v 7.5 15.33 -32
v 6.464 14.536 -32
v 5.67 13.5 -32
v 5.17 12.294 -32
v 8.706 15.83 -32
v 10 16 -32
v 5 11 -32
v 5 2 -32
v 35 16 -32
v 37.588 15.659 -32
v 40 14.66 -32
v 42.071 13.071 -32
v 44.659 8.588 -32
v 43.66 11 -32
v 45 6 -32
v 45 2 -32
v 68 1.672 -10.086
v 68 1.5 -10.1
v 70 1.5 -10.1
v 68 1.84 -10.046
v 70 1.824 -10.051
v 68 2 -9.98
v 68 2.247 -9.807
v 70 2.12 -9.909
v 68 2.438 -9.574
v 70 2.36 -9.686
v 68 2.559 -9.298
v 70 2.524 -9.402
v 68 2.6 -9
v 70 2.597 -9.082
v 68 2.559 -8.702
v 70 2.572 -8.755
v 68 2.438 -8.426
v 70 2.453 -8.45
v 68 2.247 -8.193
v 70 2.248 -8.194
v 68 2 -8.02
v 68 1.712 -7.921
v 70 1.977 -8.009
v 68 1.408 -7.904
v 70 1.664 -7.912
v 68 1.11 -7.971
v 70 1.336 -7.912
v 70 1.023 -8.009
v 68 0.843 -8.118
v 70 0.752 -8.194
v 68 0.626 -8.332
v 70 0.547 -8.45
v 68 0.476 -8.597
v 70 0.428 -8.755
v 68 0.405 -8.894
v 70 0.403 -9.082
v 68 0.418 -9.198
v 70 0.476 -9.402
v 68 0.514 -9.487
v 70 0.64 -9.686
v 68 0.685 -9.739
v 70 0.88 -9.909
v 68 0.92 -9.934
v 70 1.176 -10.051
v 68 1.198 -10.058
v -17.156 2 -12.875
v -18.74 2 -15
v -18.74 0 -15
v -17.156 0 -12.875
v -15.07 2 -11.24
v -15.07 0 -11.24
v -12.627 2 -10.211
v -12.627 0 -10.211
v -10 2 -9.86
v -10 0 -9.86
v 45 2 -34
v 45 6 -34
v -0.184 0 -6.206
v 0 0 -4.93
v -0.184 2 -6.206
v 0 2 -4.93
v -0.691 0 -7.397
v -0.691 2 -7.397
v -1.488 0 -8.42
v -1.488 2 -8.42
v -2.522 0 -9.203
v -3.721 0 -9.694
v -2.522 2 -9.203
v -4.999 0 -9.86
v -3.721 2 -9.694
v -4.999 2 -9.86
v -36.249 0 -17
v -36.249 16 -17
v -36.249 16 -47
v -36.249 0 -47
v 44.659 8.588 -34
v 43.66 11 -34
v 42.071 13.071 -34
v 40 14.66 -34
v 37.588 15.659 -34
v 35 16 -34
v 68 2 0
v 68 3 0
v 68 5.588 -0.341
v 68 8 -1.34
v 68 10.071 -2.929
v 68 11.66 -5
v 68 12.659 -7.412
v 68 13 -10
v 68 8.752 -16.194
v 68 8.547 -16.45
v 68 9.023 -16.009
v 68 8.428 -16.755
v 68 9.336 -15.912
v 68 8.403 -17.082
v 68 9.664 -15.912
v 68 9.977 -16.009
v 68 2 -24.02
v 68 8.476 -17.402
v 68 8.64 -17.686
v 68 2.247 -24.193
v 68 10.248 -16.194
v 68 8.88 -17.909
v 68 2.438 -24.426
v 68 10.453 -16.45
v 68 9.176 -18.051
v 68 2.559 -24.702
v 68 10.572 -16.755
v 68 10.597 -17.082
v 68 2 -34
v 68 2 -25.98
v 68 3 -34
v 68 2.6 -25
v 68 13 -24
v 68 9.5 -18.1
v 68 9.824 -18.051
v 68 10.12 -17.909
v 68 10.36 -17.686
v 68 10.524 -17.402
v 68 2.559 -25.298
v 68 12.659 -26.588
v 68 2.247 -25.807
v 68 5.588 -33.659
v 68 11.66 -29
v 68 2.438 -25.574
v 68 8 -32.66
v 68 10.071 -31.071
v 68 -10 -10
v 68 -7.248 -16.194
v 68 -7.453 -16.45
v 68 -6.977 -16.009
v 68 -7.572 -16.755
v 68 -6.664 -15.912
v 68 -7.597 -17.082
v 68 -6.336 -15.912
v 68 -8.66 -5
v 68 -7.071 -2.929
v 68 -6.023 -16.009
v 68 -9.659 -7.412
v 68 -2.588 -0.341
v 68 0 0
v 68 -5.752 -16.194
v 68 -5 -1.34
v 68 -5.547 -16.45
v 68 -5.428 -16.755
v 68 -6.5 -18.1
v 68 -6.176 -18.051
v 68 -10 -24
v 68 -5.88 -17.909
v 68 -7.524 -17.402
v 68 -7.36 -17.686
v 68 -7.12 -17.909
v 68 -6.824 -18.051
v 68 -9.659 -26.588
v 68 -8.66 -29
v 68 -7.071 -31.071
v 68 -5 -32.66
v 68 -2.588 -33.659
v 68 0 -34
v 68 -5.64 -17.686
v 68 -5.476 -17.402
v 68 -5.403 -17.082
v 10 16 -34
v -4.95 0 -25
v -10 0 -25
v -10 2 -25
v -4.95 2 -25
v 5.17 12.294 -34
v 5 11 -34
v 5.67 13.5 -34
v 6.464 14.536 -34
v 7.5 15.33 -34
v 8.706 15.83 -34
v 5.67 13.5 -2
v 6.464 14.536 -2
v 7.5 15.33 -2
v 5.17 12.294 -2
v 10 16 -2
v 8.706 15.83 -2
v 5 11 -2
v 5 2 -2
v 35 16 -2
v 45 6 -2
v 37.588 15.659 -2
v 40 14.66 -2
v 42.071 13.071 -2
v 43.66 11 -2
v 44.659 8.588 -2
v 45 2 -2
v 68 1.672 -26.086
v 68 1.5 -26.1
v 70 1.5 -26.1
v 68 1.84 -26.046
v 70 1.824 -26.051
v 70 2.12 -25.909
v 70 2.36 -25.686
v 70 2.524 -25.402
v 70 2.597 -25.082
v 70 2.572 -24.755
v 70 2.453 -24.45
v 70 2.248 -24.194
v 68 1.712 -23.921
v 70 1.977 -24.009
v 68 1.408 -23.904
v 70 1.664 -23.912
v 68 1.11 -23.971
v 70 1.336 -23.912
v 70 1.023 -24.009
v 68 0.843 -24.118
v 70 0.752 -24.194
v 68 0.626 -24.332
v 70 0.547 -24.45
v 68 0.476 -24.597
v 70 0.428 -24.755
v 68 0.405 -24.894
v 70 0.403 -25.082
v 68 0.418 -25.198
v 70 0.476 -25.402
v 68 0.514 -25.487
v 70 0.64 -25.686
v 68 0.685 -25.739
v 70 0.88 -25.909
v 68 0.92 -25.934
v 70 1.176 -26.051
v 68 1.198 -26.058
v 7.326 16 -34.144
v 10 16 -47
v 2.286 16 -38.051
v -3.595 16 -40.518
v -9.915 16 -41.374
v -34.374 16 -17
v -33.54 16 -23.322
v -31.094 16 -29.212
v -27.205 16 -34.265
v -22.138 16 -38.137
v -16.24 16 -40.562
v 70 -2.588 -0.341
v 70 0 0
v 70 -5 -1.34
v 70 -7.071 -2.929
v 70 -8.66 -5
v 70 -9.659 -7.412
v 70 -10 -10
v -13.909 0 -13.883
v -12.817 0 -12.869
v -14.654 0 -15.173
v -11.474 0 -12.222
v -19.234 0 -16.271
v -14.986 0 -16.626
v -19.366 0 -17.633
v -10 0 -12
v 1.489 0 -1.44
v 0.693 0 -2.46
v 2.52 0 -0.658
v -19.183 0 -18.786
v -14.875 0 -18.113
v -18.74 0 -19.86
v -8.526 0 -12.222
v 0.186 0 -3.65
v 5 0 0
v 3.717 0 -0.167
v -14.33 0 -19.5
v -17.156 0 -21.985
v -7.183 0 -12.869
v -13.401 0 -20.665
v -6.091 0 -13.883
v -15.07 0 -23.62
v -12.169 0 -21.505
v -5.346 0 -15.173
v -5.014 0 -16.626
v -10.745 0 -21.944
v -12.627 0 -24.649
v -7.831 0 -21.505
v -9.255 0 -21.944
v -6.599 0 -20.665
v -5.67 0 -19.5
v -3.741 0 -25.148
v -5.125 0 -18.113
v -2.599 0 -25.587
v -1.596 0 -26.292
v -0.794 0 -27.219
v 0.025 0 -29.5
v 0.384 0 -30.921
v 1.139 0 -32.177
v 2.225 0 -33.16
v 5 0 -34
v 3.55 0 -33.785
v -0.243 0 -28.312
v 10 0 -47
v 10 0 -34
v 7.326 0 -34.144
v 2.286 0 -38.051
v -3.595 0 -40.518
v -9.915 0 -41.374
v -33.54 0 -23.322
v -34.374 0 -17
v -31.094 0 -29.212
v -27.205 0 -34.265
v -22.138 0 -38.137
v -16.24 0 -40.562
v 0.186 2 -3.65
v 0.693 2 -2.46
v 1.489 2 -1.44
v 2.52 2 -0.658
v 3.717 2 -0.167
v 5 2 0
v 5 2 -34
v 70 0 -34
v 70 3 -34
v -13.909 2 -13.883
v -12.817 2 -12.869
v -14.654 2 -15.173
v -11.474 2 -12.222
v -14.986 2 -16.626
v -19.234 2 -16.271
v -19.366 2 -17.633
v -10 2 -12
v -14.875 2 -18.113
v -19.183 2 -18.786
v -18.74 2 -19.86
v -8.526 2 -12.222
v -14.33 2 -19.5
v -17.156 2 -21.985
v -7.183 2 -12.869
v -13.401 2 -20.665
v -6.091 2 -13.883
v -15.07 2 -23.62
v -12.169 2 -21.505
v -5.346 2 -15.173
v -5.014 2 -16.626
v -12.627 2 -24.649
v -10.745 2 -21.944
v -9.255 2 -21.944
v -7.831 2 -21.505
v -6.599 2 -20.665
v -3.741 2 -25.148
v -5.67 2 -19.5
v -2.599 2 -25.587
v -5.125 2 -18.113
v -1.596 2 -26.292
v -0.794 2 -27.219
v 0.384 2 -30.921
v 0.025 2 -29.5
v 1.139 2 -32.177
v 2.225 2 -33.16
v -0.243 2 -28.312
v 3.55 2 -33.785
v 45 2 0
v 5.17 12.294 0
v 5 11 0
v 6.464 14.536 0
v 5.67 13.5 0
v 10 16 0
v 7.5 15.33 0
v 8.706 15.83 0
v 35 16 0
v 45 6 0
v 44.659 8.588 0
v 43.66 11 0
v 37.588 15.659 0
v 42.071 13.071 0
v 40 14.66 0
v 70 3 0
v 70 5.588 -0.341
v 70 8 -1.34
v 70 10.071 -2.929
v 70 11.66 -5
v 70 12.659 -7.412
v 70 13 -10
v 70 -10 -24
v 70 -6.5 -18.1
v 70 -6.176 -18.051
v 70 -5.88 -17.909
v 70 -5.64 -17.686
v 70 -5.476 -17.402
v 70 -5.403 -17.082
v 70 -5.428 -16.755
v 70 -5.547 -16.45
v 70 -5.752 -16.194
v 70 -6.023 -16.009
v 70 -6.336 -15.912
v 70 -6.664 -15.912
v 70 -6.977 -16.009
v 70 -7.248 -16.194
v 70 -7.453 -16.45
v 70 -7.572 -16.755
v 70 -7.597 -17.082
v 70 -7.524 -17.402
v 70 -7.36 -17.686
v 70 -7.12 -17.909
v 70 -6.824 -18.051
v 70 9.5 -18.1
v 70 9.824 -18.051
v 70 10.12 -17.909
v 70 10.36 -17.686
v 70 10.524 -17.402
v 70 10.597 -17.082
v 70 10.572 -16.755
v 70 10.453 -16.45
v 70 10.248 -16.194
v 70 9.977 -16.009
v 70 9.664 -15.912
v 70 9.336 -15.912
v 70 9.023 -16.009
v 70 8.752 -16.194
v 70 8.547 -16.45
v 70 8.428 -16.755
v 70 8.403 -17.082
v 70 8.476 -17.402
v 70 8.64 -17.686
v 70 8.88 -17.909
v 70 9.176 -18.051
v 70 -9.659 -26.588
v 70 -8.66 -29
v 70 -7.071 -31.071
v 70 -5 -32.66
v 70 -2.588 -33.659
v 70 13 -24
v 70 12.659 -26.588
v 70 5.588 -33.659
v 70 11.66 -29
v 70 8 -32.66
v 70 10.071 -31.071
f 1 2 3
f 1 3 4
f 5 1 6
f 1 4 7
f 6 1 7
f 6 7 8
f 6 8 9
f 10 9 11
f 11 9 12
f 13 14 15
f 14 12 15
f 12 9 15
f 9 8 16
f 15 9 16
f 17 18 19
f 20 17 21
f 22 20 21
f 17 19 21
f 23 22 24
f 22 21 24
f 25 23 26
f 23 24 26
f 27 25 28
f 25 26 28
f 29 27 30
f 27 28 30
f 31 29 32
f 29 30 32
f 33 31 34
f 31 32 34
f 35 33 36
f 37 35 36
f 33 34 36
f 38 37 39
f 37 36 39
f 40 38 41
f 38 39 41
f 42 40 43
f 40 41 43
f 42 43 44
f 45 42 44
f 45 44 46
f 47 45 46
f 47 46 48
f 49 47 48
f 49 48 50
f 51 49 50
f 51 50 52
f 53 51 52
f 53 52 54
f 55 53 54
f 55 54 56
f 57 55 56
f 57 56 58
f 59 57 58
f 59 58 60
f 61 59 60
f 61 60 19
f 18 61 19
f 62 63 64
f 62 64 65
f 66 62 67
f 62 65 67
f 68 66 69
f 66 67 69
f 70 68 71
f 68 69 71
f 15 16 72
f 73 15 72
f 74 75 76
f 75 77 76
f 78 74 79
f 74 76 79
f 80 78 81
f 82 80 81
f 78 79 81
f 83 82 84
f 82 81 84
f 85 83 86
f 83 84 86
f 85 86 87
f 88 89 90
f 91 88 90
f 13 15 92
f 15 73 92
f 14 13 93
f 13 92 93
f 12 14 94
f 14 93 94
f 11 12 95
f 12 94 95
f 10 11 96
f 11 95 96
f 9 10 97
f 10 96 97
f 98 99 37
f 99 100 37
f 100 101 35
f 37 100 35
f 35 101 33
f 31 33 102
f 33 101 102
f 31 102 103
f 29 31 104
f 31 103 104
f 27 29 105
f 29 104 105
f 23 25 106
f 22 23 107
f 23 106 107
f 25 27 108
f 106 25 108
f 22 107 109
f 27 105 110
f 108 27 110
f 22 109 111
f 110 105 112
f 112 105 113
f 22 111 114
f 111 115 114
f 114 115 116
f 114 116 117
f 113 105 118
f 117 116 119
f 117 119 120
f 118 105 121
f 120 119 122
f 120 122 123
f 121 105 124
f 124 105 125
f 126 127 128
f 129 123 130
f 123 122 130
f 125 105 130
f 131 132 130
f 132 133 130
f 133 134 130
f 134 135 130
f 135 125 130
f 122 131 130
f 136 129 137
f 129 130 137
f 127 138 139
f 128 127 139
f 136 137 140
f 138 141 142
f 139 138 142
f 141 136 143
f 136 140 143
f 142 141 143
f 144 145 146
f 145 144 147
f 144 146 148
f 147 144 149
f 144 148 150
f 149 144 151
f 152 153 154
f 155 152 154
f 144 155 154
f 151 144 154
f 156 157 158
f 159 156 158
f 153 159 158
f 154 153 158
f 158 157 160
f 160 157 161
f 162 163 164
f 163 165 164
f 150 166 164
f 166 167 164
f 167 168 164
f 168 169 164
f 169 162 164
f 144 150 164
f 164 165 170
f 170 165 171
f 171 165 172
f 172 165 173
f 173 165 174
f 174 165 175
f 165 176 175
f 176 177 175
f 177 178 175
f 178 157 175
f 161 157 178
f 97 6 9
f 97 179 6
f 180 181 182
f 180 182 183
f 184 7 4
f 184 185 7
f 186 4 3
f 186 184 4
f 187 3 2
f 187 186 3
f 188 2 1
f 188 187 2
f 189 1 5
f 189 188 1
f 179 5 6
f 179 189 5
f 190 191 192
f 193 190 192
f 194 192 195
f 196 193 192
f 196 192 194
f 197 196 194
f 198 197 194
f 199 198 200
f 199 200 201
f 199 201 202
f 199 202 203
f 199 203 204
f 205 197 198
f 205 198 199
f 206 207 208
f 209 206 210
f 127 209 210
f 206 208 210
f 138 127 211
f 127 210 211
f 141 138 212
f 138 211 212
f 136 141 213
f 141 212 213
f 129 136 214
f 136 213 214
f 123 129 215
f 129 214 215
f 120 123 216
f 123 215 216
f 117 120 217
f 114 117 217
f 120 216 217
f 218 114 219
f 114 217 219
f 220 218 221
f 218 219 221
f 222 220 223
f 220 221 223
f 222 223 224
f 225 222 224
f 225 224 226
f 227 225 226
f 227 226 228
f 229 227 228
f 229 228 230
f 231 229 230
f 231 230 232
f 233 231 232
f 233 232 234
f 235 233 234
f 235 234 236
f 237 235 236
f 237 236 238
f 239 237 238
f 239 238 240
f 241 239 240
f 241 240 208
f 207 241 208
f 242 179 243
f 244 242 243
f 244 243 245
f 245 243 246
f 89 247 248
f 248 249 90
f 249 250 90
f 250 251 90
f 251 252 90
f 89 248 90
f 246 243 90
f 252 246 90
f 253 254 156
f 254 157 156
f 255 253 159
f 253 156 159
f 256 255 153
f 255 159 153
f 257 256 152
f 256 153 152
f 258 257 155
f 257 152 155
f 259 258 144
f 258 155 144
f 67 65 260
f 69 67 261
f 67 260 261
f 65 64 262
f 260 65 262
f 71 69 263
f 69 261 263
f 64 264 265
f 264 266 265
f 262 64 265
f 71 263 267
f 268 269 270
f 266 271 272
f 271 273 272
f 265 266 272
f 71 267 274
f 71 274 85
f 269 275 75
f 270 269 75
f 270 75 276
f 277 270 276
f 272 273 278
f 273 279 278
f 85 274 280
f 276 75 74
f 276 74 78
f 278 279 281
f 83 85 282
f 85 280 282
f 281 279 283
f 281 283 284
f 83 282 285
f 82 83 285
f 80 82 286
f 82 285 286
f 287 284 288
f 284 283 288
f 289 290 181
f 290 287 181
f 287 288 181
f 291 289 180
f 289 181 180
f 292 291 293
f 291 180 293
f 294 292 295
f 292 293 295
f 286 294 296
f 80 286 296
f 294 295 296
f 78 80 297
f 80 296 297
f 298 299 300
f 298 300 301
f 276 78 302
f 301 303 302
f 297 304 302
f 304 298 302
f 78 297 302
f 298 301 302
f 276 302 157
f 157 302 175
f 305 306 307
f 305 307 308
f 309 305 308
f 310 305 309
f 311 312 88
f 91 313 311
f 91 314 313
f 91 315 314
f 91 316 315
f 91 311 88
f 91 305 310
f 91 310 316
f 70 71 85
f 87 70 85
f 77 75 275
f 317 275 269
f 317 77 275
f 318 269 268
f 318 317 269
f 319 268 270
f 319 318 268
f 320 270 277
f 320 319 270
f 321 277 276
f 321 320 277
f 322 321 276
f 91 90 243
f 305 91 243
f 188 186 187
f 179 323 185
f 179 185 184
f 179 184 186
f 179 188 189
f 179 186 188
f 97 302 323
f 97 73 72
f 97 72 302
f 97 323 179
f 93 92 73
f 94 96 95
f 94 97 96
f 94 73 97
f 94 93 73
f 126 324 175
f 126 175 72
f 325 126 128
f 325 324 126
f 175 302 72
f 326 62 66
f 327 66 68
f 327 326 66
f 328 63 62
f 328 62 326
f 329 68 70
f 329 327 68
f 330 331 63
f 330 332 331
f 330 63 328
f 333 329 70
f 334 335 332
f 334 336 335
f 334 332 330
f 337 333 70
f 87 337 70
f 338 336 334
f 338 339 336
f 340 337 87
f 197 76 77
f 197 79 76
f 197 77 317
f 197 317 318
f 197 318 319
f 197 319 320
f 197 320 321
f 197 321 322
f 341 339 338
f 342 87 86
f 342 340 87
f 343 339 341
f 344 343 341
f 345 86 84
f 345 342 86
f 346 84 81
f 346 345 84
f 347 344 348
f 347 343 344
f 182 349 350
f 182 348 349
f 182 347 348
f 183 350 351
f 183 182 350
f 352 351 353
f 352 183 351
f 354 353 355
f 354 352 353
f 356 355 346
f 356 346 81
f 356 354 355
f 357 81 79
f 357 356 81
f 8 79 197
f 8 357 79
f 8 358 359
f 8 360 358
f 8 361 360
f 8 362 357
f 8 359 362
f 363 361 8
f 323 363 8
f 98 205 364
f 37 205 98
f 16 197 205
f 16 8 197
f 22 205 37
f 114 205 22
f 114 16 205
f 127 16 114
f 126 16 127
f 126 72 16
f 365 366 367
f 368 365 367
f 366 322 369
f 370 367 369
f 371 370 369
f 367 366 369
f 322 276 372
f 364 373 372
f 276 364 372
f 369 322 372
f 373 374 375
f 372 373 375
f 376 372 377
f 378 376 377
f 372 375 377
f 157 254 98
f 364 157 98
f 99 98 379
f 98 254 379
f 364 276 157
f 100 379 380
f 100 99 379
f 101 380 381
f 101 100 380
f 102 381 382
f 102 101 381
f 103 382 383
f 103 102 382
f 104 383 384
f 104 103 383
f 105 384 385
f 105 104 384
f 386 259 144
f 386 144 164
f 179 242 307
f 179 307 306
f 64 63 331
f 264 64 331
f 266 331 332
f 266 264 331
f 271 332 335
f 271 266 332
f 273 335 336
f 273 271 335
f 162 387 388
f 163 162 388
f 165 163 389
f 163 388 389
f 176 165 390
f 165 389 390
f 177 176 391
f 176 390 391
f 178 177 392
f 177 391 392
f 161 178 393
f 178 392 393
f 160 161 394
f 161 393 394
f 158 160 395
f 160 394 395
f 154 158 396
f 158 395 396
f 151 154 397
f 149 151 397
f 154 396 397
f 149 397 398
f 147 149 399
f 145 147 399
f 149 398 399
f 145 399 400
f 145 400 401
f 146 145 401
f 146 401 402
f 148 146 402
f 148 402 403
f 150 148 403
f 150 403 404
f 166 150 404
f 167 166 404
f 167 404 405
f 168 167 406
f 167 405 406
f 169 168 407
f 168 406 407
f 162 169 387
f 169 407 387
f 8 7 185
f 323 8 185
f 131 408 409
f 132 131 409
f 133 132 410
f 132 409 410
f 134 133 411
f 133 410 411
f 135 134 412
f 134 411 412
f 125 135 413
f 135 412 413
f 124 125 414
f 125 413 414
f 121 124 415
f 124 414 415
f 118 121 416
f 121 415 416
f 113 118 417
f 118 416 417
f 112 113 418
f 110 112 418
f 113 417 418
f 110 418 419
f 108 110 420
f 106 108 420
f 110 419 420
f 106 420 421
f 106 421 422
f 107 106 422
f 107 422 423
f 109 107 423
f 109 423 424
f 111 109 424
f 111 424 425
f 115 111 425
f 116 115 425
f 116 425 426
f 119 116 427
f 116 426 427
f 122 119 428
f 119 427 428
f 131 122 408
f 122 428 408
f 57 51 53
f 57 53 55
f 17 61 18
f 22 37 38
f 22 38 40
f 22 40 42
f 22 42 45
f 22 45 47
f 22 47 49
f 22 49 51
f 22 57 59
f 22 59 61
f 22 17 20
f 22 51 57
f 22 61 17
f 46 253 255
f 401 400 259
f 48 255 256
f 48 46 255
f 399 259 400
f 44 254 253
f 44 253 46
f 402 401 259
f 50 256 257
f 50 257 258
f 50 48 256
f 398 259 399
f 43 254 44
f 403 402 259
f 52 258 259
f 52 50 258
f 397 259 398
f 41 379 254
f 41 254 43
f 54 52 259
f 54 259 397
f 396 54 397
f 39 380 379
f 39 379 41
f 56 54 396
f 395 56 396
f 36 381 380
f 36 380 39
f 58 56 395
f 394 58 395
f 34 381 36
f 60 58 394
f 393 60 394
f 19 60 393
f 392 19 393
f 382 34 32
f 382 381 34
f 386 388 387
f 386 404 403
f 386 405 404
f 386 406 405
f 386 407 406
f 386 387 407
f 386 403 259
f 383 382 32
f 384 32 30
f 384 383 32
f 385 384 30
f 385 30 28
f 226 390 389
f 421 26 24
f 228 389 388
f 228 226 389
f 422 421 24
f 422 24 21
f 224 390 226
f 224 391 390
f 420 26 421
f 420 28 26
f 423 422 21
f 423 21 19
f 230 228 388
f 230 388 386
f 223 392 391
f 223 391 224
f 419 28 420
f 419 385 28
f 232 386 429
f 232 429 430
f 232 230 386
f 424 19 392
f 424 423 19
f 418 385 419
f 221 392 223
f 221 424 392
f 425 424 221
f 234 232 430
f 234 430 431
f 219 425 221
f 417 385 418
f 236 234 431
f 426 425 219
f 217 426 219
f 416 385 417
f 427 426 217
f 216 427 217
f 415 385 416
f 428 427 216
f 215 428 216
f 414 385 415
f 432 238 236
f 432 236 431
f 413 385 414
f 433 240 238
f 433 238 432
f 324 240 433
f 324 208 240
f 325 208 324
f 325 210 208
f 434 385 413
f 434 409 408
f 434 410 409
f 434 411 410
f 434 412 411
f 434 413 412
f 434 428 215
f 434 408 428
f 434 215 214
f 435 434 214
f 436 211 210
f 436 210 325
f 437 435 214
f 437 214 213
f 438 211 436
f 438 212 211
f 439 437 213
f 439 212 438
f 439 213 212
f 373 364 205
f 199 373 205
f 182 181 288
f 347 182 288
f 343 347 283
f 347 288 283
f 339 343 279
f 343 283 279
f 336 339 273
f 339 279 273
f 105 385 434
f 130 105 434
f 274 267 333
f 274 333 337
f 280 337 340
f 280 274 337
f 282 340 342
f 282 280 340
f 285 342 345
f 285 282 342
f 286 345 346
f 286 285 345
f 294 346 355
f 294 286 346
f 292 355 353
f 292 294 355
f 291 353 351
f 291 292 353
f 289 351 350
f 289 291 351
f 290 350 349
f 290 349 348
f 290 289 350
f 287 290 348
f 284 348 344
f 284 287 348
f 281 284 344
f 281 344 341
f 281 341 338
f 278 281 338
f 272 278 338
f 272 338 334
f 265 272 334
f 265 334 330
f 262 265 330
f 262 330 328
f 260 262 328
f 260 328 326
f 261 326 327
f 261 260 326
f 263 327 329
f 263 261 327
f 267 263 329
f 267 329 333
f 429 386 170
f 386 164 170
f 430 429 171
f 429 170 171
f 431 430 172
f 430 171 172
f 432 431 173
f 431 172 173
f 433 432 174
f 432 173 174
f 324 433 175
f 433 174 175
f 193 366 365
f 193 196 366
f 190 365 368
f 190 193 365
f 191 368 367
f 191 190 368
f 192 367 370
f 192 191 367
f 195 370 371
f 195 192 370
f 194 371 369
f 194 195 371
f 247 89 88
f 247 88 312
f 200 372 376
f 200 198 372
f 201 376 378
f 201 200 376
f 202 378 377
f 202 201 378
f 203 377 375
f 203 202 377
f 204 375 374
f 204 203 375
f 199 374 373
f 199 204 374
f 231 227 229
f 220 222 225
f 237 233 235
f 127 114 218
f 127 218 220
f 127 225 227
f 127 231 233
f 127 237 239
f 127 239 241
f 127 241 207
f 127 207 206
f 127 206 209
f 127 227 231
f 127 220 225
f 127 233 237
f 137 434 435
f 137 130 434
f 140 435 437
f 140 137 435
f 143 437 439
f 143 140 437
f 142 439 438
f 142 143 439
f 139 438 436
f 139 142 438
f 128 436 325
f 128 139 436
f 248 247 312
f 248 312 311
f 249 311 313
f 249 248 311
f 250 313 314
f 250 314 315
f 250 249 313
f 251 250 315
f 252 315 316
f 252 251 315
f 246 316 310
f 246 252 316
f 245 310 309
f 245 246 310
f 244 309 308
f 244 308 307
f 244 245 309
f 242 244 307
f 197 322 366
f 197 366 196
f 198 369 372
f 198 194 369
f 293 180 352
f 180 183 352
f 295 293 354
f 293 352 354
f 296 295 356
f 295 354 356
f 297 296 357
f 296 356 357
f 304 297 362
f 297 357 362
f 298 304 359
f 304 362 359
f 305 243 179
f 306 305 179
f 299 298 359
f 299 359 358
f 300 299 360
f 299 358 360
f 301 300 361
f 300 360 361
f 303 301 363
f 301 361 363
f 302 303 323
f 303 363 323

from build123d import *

# Parameters (mm, degrees)
ESQUISSE1_W             = 70
ESQUISSE1_H             = 34
ESQUISSE1_W_2           = 20
ESQUISSE1_H_2           = 15.140348997
ESQUISSE1_R             = 5
BOSS_EXTRU_1_DEPTH      = 2
CONG_1_R                = 10
CONG_3_R                = 5
CONG_4_R                = 5
CONG_5_R                = 5
ESQUISSE2_W             = 40
ESQUISSE2_H             = 2
BOSS_EXTRU_2_DEPTH      = 14
CONG_6_R                = 5
CONG_7_R                = 10
BOSS_EXTRU_3_DEPTH      = 16
ESQUISSE5_W             = 34
ESQUISSE5_H             = 11
ESQUISSE5_H_2           = 10
BOSS_EXTRU_4_DEPTH      = 2
ESQUISSE7_R             = 1.1
ENL_V_MAT_EXTRU_1_DEPTH = 2
CONG_8_R                = 10


with BuildPart() as part:
    # Esquisse1 → Boss.-Extru.1 (new body)
    # profile 1 of 2: a face of its own
    with BuildSketch(Plane(origin=(0, 0, 0), x_dir=(1, 0, 0), z_dir=(0, 1, 0))):
        with Locations((35, 17)):
            Rectangle(ESQUISSE1_W, ESQUISSE1_H)
    # profile 2 of 2: a face of its own
    with BuildSketch(Plane(origin=(0, 0, 0), x_dir=(1, 0, 0), z_dir=(0, 1, 0))):
        with Locations((-10, 17.429825501)):
            Rectangle(ESQUISSE1_W_2, ESQUISSE1_H_2)
        with Locations(Location((-10, 17, 0), (0, 0, 270))):
            Circle(ESQUISSE1_R, mode=Mode.SUBTRACT)
    extrude(amount=BOSS_EXTRU_1_DEPTH)

    # Congé1
    # the kernel refuses this fillet: 10 mm, written as the material it takes off along each edge
    with BuildSketch(Plane(origin=(-20, -25, -25), x_dir=(0, 0, 1), z_dir=(0, 1, 0)), Plane(origin=(-20, -25, -9.859651003), x_dir=(1, 0, 0), z_dir=(0, 1, 0))) as cong_1_piece_1:
        with BuildLine():
            CenterArc((CONG_1_R, CONG_1_R), CONG_1_R, 180, 90)
            Line((0, CONG_1_R), (0, 0))
            Line((0, 0), (CONG_1_R, 0))
        make_face()
    extrude(amount=52, mode=Mode.SUBTRACT)

    # Congé3
    cong_3_edges = [part.edges().sort_by_distance(p)[0] for p in [
        (-19.700306595, 1, -17.429825502),
    ]]
    fillet(cong_3_edges, radius=CONG_3_R)

    # Congé4
    cong_4_edges = [part.edges().sort_by_distance(p)[0] for p in [
        (0, 1, -34),
        (0, 1, 0),
    ]]
    fillet(cong_4_edges, radius=CONG_4_R)

    # Congé5
    cong_5_edges = [part.edges().sort_by_distance(p)[0] for p in [
        (0, 1, -25),
        (0, 1, -9.859651003),
    ]]
    fillet(cong_5_edges, radius=CONG_5_R)

    # Esquisse2 → Boss.-Extru.2 (add)
    with BuildSketch(Plane(origin=(0, 2, 0), x_dir=(1, 0, 0), z_dir=(0, 1, 0))):
        with Locations((25, 1)):
            Rectangle(ESQUISSE2_W, ESQUISSE2_H)
        with Locations((25, 33)):
            Rectangle(ESQUISSE2_W, ESQUISSE2_H)
    extrude(amount=BOSS_EXTRU_2_DEPTH)

    # Congé6
    cong_6_edges = [part.edges().sort_by_distance(p)[0] for p in [
        (5, 16, -33),
        (5, 16, -1),
    ]]
    fillet(cong_6_edges, radius=CONG_6_R)

    # Congé7
    cong_7_edges = [part.edges().sort_by_distance(p)[0] for p in [
        (45, 16, -33),
        (45, 16, -1),
    ]]
    fillet(cong_7_edges, radius=CONG_7_R)

    # Esquisse5 → Boss.-Extru.4 (add)
    with BuildSketch(Plane(origin=(70, 0, 0), x_dir=(0, 0, -1), z_dir=(1, 0, 0))):
        with Locations((17, 7.5)):
            Rectangle(ESQUISSE5_W, ESQUISSE5_H)
        with Locations((17, -5)):
            Rectangle(ESQUISSE5_W, ESQUISSE5_H_2)
    extrude(amount=-BOSS_EXTRU_4_DEPTH)

    # Esquisse7 → Enlèv. mat.-Extru.1 (cut)
    with BuildSketch(Plane(origin=(70, 0, 0), x_dir=(0, 0, -1), z_dir=(1, 0, 0))):
        with Locations((25, 1.5)):
            Circle(ESQUISSE7_R)
        with Locations((17, -6.5)):
            Circle(ESQUISSE7_R)
        with Locations((9, 1.5)):
            Circle(ESQUISSE7_R)
        with Locations((17, 9.5)):
            Circle(ESQUISSE7_R)
    extrude(amount=-ENL_V_MAT_EXTRU_1_DEPTH, mode=Mode.SUBTRACT)

    # Congé8
    cong_8_edges = [part.edges().sort_by_distance(p)[0] for p in [
        (69, -10, 0),
        (69, -10, -34),
        (69, 13, -34),
        (69, 13, 0),
    ]]
    fillet(cong_8_edges, radius=CONG_8_R)


with BuildPart() as body_2:
    # Esquisse4 → Boss.-Extru.3 (new body)
    with BuildSketch(Plane(origin=(0, 16, 0), x_dir=(1, 0, 0), z_dir=(0, 1, 0))):
        with BuildLine():
            ThreePointArc((10, 34), (-19.05604246, 41.637128383), (-36.248809497, 17))
            Line((-36.248809497, 17), (-36.248809497, 47))
            Line((-36.248809497, 47), (10, 47))
            Line((10, 47), (10, 34))
        make_face()
        with BuildLine():
            Line((-36.248809497, 17), (-34.374098883, 17))
            ThreePointArc((-34.374098883, 17), (-19.268300711, 39.543187403), (7.325518463, 34.144185788))
            Line((7.325518463, 34.144185788), (10, 34))
            ThreePointArc((10, 34), (-19.05604246, 41.637128383), (-36.248809497, 17))
        make_face()
    extrude(amount=-BOSS_EXTRU_3_DEPTH)


solid = Compound([part.part, body_2.part])
